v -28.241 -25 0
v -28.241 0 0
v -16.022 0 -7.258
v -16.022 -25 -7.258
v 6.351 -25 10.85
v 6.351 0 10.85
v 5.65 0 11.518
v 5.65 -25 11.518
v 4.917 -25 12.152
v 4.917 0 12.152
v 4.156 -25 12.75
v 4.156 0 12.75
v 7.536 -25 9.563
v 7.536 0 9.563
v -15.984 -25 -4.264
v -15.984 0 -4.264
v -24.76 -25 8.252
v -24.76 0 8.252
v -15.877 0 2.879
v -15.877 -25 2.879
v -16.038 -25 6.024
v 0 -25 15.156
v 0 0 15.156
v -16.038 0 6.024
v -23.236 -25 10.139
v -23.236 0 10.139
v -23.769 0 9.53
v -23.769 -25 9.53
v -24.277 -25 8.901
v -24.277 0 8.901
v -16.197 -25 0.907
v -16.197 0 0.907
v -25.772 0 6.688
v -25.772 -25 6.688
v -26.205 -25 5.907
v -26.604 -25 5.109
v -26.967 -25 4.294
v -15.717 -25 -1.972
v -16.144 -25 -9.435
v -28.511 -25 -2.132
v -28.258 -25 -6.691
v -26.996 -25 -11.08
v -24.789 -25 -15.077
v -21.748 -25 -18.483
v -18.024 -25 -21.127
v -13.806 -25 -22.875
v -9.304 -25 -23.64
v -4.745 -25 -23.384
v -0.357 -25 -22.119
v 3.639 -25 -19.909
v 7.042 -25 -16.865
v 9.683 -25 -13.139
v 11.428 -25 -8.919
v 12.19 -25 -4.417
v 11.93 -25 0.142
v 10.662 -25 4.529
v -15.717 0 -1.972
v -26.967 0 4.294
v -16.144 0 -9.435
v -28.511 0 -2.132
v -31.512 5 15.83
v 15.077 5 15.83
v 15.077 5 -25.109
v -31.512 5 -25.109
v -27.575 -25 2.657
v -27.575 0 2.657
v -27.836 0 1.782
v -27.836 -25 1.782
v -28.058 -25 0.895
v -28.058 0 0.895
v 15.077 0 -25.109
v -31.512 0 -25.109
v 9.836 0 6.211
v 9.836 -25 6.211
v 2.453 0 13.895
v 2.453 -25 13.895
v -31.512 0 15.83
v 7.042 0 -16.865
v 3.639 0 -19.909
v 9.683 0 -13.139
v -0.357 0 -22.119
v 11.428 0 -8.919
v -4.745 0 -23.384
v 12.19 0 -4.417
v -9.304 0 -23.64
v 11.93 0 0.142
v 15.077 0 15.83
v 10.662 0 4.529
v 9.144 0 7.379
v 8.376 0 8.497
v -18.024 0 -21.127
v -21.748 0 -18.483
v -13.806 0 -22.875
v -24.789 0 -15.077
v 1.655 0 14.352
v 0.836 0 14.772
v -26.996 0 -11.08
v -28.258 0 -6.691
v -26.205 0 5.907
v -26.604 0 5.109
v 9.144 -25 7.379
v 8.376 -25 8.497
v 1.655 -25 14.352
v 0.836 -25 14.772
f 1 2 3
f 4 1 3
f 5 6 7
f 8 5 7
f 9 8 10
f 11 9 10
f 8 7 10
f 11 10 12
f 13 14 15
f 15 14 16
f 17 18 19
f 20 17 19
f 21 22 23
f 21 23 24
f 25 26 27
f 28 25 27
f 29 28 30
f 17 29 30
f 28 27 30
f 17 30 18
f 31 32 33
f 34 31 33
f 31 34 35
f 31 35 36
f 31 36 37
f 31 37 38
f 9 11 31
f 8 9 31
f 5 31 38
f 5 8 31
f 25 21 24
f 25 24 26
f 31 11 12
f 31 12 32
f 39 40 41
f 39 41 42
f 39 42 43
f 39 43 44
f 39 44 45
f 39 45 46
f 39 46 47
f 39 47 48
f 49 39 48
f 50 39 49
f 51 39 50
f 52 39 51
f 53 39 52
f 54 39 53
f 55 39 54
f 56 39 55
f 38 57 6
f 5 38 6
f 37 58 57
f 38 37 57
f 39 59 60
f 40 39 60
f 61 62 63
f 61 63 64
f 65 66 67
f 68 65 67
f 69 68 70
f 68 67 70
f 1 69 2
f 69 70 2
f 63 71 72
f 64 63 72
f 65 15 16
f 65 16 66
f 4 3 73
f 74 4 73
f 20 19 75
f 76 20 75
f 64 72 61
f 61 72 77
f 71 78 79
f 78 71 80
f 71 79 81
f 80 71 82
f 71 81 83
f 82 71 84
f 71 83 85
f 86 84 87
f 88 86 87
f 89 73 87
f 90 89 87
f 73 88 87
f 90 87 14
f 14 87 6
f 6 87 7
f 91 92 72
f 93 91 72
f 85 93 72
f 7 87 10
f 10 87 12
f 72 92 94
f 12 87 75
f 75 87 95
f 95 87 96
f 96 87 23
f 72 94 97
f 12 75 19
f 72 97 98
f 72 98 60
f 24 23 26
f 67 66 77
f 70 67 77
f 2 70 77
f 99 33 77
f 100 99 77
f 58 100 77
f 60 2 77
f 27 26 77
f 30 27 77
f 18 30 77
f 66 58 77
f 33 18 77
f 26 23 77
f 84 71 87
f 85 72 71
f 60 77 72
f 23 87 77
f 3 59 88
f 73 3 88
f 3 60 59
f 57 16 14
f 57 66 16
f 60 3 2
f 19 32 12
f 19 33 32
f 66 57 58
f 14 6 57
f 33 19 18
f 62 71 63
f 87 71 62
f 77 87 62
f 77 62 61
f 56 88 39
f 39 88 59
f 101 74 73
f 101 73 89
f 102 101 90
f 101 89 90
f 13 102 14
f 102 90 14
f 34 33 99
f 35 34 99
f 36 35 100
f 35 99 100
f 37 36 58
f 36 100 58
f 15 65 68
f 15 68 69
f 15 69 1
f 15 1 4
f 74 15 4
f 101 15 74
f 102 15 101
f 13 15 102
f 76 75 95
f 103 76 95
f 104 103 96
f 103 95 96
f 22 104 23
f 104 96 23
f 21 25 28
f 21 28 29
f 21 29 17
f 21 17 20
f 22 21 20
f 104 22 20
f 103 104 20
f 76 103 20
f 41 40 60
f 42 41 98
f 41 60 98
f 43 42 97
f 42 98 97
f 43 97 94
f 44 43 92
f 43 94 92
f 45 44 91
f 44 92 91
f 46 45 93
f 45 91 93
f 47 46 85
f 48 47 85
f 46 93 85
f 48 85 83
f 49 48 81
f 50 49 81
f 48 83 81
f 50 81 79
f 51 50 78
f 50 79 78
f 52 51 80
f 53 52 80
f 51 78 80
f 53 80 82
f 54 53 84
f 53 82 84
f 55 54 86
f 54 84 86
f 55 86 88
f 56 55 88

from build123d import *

# Parameters (mm, degrees)
F1_DEPTH = 25
F2_W     = 46.5890942141
F2_H     = 40.938699618
F3_DEPTH = 5


with BuildPart() as f1:
    # F0 (on Front) → F1 (new body)
    with BuildSketch(Plane.XZ):
        with BuildLine():
            Line((-16.1972109335, 0.9067526987), (-25.7715200782, 6.687763864))
            ThreePointArc((-25.7715200782, 6.687763864), (-26.4086461718, 5.5104664675), (-26.9674355795, 4.2940318342))
            Line((-26.9674355795, 4.2940318342), (-15.7174587356, -1.9717497783))
            Line((-15.7174587356, -1.9717497783), (6.3511966728, 10.8503689989))
            ThreePointArc((6.3511966728, 10.8503689989), (5.287091796, 11.839308975), (4.1555075794, 12.7502637629))
            Line((4.1555075794, 12.7502637629), (-16.1972109335, 0.9067526987))
        make_face()
    extrude(amount=F1_DEPTH)



with BuildPart() as f1b:
    # F0 (on Front) → F1, piece 2 (new body)
    with BuildSketch(Plane.XZ):
        with BuildLine():
            Line((-16.0378590226, 6.0243331827), (-23.2363295217, 10.1388221312))
            ThreePointArc((-23.2363295217, 10.1388221312), (-24.0260011213, 9.2177770372), (-24.759702406, 8.2515536028))
            Line((-24.759702406, 8.2515536028), (-15.8774183356, 2.8789895778))
            Line((-15.8774183356, 2.8789895778), (2.4531573144, 13.8953773195))
            ThreePointArc((2.4531573144, 13.8953773195), (1.2478332365, 14.5668583693), (0, 15.1555901816))
            Line((0, 15.1555901816), (-16.0378590226, 6.0243331827))
        make_face()
    extrude(amount=F1_DEPTH)


with BuildPart() as f1c:
    # F0 (on Front) → F1, piece 3 (new body)
    with BuildSketch(Plane.XZ):
        with BuildLine():
            Line((-15.9839864927, -4.2638920279), (-27.5745631276, 2.6574631844))
            ThreePointArc((-27.5745631276, 2.6574631844), (-27.9521231277, 1.3398909811), (-28.2406369461, 0))
            Line((-28.2406369461, 0), (-16.0219292804, -7.2582247378))
            Line((-16.0219292804, -7.2582247378), (9.8358221023, 6.2114192202))
            ThreePointArc((9.8358221023, 6.2114192202), (8.7691326541, 7.944430892), (7.5355910537, 9.5629274021))
            Line((7.5355910537, 9.5629274021), (-15.9839864927, -4.2638920279))
        make_face()
    extrude(amount=F1_DEPTH)


with BuildPart() as f1d:
    # F0 (on Front) → F1, piece 4 (new body)
    with BuildSketch(Plane.XZ):
        with BuildLine():
            Line((-16.143903892, -9.4345344262), (-28.5108022498, -2.1316674104))
            ThreePointArc((-28.5108022498, -2.1316674104), (-4.7449734761, -23.3835199279), (10.6615230255, 4.528766225))
            Line((10.6615230255, 4.528766225), (-16.143903892, -9.4345344262))
        make_face()
    extrude(amount=F1_DEPTH)


with BuildPart() as f1_1:
    add(f1.part)

    add(f1b.part)  # F3 merges F1b

    add(f1c.part)  # F3 merges F1c

    add(f1d.part)  # F3 merges F1d
    # F2 (on face) → F3 (join)
    with BuildSketch(Plane(origin=(0, 0, 0), x_dir=(-1, 0, 0), z_dir=(0, 1, 0))):
        with Locations((8.2179331221, -4.6391794458)):
            Rectangle(F2_W, F2_H)
        with BuildLine():
            Line((-10.6615230255, 4.528766225), (16.143903892, -9.4345344262))
            Line((16.143903892, -9.4345344262), (28.5108022498, -2.1316674104))
            ThreePointArc((28.5108022498, -2.1316674104), (4.7449734761, -23.3835199279), (-10.6615230255, 4.528766225))
        make_face(mode=Mode.SUBTRACT)
        with BuildLine():
            Line((28.5108022498, -2.1316674104), (16.143903892, -9.4345344262))
            Line((16.143903892, -9.4345344262), (-10.6615230255, 4.528766225))
            ThreePointArc((-10.6615230255, 4.528766225), (4.7449734761, -23.3835199279), (28.5108022498, -2.1316674104))
        make_face()
    extrude(amount=F3_DEPTH)


solid = f1_1.part
